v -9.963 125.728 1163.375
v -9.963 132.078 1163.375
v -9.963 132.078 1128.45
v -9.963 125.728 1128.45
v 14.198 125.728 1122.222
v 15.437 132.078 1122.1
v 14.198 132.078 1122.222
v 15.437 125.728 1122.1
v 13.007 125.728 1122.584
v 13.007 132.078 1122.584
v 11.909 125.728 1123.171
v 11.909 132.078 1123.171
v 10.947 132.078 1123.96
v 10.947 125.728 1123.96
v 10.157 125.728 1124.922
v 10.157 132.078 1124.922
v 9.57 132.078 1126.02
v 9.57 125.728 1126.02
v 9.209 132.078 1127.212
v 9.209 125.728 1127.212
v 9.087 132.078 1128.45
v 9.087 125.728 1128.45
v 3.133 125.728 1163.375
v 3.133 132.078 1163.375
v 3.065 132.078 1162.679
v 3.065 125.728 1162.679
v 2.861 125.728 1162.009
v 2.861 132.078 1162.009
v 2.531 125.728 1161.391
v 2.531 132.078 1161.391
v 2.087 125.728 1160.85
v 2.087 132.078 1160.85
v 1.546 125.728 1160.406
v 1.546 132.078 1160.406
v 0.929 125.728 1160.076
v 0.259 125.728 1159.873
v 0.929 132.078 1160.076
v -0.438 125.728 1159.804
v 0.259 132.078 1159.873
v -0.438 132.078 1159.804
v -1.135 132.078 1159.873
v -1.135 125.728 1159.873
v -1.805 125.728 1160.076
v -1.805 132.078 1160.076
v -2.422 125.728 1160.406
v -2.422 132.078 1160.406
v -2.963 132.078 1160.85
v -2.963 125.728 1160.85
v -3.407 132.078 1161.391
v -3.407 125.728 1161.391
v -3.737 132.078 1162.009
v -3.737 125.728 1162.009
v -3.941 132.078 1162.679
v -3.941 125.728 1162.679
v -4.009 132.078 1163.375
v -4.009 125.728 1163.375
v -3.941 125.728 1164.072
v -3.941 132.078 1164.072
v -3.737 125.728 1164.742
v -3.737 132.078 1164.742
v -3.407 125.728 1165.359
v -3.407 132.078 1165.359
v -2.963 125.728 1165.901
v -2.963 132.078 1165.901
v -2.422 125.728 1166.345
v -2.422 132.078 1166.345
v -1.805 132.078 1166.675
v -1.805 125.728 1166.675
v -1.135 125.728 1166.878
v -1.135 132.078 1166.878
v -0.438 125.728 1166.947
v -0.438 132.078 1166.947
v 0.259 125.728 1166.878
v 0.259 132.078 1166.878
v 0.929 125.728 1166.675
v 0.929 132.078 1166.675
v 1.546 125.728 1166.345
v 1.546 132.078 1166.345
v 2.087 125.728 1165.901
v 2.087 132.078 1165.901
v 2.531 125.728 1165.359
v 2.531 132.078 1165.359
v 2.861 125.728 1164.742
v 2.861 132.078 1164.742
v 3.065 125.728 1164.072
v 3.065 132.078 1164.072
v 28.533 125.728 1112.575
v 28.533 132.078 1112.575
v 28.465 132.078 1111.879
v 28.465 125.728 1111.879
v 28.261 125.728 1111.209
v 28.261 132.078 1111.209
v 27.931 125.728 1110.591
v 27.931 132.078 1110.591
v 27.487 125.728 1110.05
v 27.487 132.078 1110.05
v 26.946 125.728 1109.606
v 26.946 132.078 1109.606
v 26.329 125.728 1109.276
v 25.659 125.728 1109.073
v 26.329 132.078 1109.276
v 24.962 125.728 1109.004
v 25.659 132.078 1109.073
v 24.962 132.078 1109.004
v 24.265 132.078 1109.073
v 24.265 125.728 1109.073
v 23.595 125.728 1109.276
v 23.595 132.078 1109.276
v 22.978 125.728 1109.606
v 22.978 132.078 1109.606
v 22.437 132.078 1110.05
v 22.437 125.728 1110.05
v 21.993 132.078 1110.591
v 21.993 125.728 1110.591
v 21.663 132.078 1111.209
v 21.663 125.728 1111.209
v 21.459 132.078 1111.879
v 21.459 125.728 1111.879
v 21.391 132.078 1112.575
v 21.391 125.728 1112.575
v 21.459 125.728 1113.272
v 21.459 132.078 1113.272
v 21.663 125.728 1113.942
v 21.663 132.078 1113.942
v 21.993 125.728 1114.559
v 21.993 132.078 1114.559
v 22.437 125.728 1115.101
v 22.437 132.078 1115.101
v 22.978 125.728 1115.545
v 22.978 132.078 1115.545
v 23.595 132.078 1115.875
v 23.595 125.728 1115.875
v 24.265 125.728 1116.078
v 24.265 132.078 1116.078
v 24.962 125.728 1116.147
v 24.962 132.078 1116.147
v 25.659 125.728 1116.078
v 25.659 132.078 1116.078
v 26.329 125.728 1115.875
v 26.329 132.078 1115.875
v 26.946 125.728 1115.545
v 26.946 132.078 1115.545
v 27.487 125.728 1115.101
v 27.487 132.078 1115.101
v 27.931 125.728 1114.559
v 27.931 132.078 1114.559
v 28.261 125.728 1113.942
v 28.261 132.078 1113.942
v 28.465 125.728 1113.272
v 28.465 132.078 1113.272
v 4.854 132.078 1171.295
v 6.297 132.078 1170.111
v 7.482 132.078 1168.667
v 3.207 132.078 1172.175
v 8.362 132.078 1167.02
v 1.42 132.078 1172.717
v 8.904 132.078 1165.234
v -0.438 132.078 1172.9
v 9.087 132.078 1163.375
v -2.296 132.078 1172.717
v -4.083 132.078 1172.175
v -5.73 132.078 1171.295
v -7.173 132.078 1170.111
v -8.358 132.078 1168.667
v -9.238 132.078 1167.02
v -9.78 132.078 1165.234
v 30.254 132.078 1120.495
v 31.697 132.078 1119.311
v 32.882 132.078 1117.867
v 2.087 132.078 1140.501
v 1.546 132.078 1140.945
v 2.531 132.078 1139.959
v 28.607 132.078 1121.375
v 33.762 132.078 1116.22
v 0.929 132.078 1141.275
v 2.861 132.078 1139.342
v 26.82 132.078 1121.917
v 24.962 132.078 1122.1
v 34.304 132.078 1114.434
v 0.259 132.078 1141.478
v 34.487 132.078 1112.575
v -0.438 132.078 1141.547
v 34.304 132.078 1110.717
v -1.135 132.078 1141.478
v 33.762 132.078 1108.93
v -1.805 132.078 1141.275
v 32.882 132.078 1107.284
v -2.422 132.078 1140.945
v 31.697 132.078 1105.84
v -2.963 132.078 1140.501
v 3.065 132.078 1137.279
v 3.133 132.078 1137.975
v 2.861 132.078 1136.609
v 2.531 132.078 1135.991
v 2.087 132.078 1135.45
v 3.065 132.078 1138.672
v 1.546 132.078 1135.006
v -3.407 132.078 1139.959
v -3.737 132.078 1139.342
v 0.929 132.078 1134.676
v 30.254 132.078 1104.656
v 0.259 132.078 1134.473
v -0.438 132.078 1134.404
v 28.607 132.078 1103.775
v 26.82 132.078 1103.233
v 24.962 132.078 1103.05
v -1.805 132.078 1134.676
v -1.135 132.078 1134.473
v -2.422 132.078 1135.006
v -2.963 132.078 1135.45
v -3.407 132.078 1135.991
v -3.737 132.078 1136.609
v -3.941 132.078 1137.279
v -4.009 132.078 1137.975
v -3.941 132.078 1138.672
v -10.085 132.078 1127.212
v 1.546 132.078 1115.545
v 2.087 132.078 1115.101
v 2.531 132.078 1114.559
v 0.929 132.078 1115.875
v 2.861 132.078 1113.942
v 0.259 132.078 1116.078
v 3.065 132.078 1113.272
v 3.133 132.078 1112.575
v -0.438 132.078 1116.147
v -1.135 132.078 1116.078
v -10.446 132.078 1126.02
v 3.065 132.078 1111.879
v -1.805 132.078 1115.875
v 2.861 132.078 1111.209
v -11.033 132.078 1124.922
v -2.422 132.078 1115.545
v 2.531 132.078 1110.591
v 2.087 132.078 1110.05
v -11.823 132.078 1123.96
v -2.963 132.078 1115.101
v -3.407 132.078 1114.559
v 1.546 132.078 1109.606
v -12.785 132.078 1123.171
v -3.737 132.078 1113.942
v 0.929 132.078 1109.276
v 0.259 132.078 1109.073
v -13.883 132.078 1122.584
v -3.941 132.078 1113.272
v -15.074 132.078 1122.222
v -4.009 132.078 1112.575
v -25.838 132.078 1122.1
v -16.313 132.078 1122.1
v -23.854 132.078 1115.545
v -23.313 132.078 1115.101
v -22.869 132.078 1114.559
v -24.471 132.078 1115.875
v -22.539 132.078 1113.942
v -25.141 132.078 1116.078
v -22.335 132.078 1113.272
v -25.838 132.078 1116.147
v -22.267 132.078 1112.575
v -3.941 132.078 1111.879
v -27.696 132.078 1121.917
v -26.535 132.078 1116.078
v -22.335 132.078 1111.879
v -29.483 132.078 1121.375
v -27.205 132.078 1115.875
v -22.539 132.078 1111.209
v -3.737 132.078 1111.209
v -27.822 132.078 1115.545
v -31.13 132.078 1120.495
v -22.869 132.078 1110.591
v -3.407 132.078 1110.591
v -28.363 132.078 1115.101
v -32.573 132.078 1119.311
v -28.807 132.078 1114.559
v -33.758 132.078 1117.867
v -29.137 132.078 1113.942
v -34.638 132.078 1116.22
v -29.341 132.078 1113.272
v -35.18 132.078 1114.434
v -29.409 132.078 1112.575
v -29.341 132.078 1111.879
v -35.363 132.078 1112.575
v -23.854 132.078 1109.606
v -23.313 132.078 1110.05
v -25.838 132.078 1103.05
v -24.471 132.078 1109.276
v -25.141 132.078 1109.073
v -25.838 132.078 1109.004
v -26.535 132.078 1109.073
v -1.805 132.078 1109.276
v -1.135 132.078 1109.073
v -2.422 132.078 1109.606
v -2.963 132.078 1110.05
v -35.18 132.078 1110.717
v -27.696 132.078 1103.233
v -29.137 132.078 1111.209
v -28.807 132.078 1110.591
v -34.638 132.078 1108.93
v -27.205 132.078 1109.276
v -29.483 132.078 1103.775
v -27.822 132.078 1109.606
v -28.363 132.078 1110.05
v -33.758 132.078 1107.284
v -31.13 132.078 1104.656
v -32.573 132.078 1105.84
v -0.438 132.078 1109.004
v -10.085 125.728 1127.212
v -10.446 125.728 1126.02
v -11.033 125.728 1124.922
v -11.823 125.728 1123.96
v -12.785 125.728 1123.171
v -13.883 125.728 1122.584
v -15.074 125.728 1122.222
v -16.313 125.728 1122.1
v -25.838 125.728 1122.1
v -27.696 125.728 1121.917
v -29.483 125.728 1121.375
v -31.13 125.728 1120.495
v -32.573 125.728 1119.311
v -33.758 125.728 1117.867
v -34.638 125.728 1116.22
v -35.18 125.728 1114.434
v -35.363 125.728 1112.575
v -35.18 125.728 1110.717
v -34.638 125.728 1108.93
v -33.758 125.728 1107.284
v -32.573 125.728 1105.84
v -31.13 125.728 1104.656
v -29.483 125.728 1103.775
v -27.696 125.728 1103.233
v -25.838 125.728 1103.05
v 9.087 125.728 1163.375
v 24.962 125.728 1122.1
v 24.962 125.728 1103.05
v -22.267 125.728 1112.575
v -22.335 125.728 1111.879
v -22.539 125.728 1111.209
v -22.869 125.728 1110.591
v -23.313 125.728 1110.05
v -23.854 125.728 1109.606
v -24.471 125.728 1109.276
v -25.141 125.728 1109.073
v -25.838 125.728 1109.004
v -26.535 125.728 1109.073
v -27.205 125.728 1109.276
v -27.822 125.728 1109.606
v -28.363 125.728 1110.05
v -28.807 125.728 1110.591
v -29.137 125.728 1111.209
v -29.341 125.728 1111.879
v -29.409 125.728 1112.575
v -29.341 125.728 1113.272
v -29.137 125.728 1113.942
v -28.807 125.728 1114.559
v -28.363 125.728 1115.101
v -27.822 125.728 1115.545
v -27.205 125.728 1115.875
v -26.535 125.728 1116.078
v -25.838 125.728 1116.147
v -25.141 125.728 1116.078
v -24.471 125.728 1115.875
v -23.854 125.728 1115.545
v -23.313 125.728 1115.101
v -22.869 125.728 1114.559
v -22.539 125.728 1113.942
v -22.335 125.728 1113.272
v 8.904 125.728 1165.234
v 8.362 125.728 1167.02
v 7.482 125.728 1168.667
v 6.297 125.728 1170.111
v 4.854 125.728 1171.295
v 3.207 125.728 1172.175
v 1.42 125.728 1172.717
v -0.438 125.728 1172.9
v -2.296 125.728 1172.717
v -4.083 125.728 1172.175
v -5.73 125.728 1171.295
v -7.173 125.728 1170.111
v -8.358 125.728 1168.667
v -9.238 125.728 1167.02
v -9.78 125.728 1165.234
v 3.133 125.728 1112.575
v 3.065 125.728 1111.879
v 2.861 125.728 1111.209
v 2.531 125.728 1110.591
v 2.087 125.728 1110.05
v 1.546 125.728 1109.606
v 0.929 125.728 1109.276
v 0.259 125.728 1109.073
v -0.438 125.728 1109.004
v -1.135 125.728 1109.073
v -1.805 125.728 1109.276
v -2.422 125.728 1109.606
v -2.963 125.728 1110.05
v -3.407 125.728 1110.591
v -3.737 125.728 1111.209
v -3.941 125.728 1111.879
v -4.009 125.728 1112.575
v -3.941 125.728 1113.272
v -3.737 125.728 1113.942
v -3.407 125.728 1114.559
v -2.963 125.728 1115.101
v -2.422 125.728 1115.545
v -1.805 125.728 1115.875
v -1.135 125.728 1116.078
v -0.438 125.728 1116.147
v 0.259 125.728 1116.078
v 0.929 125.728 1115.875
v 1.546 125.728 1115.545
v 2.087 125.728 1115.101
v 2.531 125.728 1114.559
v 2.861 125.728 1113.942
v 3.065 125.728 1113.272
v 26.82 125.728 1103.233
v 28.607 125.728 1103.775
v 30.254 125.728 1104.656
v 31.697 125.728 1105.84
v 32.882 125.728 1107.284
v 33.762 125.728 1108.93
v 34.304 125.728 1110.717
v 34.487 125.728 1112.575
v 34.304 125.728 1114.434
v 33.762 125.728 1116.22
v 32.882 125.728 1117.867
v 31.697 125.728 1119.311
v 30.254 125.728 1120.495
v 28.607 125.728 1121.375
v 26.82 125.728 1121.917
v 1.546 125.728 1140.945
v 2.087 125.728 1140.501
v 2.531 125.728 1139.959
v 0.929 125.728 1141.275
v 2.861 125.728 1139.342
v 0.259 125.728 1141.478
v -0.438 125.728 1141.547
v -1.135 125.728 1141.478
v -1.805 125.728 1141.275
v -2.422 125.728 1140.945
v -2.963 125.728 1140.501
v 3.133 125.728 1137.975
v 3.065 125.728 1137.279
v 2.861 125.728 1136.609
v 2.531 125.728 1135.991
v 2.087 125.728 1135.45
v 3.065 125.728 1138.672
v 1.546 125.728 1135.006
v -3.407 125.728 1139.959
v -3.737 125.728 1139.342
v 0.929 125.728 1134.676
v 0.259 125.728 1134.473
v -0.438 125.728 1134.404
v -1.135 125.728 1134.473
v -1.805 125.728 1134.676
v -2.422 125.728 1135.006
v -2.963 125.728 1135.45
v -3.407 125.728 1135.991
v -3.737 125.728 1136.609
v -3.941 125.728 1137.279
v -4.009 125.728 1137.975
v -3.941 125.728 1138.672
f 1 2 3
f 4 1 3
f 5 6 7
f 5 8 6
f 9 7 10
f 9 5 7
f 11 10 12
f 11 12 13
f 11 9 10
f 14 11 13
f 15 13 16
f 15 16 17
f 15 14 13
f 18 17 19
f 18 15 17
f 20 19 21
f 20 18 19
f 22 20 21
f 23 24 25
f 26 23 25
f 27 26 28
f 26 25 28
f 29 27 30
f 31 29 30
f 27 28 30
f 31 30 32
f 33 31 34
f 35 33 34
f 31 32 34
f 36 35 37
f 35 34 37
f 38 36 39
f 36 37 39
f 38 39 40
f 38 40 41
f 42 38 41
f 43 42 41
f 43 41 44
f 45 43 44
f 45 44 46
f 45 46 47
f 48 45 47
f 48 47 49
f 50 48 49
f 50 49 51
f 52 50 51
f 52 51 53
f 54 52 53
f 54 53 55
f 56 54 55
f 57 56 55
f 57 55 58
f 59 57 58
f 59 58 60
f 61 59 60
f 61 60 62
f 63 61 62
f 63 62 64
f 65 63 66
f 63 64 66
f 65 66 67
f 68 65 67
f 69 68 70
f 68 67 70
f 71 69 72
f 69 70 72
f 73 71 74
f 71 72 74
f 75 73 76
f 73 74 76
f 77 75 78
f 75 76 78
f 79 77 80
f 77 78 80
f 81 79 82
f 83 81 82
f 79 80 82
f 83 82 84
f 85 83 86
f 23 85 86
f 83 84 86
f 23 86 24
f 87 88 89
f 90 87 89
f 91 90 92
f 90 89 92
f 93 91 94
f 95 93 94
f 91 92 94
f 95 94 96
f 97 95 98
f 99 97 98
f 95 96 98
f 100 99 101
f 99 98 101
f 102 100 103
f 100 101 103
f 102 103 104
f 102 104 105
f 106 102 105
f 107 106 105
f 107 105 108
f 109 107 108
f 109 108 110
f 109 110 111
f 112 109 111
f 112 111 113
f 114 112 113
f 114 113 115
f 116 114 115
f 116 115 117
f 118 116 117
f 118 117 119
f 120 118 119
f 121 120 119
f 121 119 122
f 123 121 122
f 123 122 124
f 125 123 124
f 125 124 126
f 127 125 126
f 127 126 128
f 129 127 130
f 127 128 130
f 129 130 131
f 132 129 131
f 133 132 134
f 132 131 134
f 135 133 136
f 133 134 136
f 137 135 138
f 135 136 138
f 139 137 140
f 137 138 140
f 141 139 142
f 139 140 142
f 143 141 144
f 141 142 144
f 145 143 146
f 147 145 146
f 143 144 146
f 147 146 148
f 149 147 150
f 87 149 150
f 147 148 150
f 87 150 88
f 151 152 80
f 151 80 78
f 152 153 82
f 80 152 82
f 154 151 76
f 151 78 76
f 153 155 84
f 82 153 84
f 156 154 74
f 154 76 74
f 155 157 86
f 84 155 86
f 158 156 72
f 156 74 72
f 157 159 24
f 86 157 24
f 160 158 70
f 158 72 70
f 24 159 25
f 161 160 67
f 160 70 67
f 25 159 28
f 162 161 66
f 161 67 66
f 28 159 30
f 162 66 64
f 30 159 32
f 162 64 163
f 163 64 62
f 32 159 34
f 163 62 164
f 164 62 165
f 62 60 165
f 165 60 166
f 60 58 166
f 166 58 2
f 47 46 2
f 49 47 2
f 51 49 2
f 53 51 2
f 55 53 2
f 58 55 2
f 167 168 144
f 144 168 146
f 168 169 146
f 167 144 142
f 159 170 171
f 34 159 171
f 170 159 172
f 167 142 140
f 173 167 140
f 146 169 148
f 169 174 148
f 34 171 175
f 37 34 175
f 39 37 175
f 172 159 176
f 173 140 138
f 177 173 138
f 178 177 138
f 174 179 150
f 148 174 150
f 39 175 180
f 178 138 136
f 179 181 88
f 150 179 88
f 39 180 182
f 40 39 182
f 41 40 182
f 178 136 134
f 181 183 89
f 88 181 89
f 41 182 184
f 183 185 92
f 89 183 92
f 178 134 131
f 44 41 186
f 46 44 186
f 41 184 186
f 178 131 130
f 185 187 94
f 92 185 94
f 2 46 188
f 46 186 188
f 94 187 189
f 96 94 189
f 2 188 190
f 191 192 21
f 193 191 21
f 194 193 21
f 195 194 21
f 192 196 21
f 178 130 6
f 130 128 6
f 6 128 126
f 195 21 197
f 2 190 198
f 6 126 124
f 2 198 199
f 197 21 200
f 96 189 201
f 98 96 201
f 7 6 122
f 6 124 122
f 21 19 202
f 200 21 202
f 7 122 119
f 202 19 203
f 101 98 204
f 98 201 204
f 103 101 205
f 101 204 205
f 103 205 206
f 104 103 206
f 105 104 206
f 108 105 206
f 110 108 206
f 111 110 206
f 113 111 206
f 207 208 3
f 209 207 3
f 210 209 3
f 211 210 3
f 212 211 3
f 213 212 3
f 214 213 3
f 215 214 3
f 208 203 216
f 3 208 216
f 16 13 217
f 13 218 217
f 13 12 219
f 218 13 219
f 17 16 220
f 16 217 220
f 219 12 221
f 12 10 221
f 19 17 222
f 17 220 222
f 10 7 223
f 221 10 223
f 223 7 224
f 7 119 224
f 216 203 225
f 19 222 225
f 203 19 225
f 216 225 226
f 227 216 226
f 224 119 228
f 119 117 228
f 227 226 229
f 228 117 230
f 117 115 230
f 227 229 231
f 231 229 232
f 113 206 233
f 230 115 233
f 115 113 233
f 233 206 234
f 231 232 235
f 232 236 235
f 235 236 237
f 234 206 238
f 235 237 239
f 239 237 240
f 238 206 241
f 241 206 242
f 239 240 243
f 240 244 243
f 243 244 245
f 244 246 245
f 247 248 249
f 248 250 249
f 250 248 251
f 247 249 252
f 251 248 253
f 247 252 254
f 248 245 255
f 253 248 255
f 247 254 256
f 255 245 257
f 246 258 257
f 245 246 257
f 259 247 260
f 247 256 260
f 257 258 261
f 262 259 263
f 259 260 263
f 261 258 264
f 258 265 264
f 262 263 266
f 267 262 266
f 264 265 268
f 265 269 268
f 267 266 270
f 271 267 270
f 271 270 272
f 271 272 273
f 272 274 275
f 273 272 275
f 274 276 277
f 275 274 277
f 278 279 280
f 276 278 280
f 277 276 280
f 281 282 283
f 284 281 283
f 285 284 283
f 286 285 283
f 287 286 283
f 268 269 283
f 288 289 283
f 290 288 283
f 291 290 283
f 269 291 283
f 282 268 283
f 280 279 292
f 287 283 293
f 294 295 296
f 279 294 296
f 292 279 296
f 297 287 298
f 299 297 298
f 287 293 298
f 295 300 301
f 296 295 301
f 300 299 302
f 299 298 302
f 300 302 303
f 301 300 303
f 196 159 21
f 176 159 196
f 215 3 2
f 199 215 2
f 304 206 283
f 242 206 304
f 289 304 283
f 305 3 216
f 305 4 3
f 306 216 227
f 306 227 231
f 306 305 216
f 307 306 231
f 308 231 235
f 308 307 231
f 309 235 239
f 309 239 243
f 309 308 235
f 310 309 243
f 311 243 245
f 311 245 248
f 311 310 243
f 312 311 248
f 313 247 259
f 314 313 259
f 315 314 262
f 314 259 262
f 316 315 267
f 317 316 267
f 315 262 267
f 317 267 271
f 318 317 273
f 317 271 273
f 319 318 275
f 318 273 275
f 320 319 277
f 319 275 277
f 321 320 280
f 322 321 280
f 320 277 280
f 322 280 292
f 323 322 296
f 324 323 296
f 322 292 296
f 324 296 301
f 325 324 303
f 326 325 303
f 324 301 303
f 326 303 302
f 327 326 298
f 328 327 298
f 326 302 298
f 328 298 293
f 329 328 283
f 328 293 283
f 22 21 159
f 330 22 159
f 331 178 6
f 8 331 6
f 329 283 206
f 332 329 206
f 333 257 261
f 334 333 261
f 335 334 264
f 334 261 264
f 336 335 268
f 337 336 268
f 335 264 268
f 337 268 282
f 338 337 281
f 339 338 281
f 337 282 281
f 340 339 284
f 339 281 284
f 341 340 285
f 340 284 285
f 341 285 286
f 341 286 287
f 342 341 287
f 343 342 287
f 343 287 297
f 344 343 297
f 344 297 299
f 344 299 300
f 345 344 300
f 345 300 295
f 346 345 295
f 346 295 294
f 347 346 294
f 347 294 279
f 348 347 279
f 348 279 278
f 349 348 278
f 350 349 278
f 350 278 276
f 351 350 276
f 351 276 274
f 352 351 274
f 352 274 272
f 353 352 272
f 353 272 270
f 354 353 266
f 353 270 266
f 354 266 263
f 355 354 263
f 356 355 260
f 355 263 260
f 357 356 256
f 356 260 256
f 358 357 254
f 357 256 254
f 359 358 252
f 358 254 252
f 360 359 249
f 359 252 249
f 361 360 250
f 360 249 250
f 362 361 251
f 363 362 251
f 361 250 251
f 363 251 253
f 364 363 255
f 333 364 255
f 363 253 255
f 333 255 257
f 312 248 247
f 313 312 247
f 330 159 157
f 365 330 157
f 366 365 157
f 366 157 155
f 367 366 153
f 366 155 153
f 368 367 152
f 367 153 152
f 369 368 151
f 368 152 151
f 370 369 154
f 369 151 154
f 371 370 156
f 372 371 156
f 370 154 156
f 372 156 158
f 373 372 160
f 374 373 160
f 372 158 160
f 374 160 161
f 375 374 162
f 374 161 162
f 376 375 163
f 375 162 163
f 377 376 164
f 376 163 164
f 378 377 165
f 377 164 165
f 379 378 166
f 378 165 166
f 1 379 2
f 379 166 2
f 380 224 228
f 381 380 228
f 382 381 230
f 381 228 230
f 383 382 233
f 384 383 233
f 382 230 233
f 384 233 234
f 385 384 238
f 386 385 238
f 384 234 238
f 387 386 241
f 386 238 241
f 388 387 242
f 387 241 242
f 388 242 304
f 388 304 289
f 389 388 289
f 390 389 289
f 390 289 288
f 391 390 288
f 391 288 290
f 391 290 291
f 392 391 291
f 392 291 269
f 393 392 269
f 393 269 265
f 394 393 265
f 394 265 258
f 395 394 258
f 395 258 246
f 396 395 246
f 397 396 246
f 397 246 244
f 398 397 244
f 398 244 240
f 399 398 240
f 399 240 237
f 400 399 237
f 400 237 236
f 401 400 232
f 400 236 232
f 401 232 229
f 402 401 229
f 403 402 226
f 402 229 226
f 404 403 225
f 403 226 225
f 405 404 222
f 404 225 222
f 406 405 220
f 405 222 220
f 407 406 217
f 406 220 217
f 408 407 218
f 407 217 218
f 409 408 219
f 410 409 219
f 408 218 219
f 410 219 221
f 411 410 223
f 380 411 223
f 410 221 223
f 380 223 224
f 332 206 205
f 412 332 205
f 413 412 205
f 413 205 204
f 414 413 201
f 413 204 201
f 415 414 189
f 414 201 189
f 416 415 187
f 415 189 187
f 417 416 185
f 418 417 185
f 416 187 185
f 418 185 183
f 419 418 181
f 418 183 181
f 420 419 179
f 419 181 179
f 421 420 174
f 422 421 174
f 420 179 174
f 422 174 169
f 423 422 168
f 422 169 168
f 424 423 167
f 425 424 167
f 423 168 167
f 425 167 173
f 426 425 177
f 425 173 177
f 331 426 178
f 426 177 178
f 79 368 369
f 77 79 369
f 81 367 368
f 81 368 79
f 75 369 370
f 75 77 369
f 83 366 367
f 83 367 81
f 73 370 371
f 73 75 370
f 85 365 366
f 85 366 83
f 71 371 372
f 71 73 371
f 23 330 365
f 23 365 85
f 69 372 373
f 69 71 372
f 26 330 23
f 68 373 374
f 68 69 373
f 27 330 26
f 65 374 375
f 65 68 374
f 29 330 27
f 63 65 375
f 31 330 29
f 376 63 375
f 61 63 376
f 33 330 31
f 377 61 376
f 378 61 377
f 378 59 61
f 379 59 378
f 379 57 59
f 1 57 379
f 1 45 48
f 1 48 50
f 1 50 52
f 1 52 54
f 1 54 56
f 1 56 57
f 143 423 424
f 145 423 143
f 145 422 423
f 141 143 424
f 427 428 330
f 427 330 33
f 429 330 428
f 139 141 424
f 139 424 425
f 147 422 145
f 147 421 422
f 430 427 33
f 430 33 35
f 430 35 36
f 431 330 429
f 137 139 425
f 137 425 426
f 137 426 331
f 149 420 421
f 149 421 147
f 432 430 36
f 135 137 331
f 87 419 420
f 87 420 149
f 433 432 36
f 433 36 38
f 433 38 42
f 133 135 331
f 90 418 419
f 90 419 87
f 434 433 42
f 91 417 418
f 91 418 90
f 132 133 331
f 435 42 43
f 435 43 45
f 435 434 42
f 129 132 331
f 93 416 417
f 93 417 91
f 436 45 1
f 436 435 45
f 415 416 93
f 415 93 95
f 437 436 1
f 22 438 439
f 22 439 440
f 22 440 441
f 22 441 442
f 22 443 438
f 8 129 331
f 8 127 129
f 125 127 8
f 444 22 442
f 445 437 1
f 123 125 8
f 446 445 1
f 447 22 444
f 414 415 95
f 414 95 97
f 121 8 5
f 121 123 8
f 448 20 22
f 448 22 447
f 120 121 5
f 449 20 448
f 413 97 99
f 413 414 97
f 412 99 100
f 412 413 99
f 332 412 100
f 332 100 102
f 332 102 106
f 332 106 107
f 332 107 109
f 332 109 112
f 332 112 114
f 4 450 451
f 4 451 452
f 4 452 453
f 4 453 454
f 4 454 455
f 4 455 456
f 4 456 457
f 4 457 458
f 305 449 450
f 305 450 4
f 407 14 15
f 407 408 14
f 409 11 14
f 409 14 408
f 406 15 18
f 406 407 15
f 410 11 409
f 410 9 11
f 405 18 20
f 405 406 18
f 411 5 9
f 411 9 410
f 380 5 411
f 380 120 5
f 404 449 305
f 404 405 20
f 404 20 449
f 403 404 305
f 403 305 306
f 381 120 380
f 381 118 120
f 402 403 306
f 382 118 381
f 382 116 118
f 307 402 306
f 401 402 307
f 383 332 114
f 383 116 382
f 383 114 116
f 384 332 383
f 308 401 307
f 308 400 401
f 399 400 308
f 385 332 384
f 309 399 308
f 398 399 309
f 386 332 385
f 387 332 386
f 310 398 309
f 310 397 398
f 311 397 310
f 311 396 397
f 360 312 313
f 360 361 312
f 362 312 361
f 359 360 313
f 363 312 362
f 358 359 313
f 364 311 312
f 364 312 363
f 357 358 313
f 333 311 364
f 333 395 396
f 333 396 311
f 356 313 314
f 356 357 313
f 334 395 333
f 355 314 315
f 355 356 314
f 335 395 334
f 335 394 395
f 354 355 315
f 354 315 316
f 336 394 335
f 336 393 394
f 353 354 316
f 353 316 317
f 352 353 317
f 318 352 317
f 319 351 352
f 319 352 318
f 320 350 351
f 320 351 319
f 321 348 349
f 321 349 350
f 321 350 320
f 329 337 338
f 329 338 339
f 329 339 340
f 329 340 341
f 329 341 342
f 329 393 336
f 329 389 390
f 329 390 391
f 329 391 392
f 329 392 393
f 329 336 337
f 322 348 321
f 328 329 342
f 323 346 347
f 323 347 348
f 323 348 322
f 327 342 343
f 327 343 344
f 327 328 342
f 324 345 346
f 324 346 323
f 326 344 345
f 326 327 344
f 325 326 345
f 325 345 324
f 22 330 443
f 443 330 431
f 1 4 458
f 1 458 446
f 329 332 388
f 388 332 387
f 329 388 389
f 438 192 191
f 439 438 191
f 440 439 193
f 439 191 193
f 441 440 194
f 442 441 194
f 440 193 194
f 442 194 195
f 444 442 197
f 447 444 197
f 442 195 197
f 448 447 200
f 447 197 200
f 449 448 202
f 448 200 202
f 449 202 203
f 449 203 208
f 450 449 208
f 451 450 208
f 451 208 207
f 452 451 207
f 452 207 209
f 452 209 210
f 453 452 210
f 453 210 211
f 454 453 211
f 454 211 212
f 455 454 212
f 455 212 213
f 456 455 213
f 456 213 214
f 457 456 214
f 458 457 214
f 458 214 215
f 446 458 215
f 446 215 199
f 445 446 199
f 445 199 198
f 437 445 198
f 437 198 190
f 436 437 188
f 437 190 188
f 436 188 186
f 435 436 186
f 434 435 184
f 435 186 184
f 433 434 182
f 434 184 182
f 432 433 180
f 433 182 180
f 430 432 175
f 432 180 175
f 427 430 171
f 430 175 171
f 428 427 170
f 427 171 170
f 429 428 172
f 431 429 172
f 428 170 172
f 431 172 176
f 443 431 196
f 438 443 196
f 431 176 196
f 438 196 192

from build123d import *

# Parameters (mm, degrees)
BOSS_EXTRUDE1_START     = 12.827
BOSS_EXTRUDE1_DEPTH     = 6.35
FILLET1_R               = 6.35
F_1_4_CLEARANCE_HOLE1_D = 7.14248


with BuildPart() as part:
    # Sketch1 → Boss-Extrude1 (new body)
    with BuildSketch(Plane(origin=(0, 144.904574554, 0), x_dir=(-1, 0, 0), z_dir=(0, -1, 0)).offset(BOSS_EXTRUDE1_START)):
        with BuildLine():
            Line((-24.961912484, -1122.100334154), (-9.086912484, -1122.100334154))
            Line((-9.086912484, -1122.100334154), (-9.086912484, -1163.375334154))
            ThreePointArc((-9.086912484, -1163.375334154), (0.438087516, -1172.900334154), (9.963087516, -1163.375334154))
            Line((9.963087516, -1163.375334154), (9.963087516, -1122.100334154))
            Line((9.963087516, -1122.100334154), (25.838087516, -1122.100334154))
            ThreePointArc((25.838087516, -1122.100334154), (35.363087516, -1112.575334154), (25.838087516, -1103.050334154))
            Line((25.838087516, -1103.050334154), (-24.961912484, -1103.050334154))
            ThreePointArc((-24.961912484, -1103.050334154), (-34.486912484, -1112.575334154), (-24.961912484, -1122.100334154))
        make_face()
    extrude(amount=BOSS_EXTRUDE1_DEPTH)

    # Fillet1
    fillet1_edges = [part.edges().sort_by_distance(p)[0] for p in [
        (-9.963087516, 128.902574554, 1122.100334154),
        (9.086912484, 128.902574554, 1122.100334154),
    ]]
    fillet(fillet1_edges, radius=FILLET1_R)

    # 1/4 Clearance Hole1 (through all)
    with Locations(Plane(origin=(0, 125.727574554, 0), x_dir=(-1, 0, 0), z_dir=(0, -1, 0))):
        with Locations((-24.961912484, -1112.575334154), (25.838087516, -1112.575334154), (0.438087516, -1137.975334154), (0.438087516, -1163.375334154), (0.438087516, -1112.575334154)):
            Hole(F_1_4_CLEARANCE_HOLE1_D / 2)


solid = part.part
